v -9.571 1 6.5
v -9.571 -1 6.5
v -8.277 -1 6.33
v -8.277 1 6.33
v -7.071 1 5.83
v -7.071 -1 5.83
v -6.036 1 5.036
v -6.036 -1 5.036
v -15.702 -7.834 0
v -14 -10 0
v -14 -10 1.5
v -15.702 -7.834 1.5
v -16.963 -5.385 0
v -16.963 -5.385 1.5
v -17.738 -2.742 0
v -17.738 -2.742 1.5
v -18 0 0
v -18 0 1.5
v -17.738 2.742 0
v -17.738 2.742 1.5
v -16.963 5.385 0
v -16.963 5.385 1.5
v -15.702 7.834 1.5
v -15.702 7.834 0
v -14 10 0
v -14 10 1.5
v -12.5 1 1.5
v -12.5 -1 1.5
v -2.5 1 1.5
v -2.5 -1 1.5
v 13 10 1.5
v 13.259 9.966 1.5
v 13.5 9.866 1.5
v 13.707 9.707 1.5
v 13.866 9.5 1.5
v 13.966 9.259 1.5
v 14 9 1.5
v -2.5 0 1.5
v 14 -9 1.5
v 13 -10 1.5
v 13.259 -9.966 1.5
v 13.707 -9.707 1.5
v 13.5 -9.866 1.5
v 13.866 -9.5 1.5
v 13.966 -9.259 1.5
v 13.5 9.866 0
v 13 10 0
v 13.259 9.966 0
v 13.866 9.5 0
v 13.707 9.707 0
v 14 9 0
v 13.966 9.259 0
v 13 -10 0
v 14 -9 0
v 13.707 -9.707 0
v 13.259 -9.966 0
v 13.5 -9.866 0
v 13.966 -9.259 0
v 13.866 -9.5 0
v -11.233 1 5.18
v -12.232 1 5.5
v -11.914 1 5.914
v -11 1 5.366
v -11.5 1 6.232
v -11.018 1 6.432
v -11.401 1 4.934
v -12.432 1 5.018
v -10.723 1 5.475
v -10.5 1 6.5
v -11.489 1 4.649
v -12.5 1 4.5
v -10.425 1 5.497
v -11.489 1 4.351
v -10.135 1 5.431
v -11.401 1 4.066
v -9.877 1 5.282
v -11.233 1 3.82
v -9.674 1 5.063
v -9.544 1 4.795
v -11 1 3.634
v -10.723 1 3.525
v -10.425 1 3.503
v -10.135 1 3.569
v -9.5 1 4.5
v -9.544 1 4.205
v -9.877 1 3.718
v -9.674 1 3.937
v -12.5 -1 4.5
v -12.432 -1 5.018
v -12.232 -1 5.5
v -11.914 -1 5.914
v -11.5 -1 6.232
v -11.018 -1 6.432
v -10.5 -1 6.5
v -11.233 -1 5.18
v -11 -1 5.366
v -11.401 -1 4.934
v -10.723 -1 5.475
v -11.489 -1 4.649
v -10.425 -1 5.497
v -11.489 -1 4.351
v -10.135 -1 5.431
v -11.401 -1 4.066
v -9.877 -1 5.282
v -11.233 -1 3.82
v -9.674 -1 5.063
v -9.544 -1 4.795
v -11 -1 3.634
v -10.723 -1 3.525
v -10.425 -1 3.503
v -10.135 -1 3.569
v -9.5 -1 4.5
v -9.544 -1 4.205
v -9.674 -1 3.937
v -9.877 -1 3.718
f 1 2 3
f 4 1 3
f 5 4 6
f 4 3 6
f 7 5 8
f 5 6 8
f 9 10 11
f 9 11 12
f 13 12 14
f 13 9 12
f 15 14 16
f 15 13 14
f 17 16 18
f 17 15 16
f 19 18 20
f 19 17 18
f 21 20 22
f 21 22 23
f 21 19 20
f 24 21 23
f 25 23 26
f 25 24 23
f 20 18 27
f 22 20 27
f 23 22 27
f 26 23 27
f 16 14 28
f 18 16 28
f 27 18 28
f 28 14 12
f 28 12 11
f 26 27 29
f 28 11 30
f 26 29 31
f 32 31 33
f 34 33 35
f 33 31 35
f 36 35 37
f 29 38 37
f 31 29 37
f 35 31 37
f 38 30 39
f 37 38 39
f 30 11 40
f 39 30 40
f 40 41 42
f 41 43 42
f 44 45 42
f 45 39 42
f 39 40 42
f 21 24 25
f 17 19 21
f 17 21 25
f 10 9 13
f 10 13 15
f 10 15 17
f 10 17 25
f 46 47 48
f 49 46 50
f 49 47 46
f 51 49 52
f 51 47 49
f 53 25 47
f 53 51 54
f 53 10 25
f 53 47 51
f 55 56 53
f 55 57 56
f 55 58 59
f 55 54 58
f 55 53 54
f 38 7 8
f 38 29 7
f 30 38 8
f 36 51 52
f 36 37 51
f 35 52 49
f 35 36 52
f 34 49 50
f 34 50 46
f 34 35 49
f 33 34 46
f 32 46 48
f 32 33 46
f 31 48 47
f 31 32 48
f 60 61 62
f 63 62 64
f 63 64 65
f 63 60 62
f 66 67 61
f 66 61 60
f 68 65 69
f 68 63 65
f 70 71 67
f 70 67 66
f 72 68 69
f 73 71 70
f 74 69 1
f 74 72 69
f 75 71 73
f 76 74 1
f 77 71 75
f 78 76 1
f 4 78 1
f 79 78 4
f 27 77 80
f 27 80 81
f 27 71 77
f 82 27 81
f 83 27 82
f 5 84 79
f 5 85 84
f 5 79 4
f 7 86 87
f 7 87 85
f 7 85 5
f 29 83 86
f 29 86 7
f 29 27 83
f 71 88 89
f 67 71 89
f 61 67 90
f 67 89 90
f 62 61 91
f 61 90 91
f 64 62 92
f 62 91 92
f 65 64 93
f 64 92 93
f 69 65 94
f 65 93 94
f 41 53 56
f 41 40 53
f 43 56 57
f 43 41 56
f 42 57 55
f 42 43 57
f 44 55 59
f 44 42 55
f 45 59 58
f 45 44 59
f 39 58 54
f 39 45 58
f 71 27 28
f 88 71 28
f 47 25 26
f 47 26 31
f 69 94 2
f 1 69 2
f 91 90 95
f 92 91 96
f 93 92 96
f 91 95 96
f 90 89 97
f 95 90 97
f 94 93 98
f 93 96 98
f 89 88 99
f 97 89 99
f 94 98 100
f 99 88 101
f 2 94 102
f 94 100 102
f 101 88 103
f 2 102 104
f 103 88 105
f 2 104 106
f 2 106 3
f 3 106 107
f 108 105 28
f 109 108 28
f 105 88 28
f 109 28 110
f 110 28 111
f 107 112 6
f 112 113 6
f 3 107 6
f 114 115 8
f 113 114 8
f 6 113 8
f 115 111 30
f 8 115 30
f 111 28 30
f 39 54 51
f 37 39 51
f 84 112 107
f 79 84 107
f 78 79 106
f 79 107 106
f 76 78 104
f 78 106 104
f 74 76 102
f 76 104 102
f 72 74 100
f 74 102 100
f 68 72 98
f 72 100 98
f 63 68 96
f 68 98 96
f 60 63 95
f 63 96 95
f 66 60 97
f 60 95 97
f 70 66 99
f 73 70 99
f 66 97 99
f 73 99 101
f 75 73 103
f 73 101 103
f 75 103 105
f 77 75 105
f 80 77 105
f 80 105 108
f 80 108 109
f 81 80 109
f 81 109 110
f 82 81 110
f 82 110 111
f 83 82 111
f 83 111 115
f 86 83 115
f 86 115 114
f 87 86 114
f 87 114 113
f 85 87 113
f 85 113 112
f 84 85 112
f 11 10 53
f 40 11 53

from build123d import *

# Parameters (mm, degrees)
F0_W      = 28
F0_H      = 20
F1_DEPTH  = 1.5
F2_R      = 1
F3_W      = 10
F3_H      = 1
F4_DEPTH  = 5
F5_R      = 2
F6_SIZE   = 4.99999
F7_R      = 5
F9_R      = 1
F10_DEPTH = 25
F12_DEPTH = 1.5


# Not quite as in the source:
# - a fillet or chamfer is up to 0.001 mm smaller than in the source, because OpenCascade refuses the exact size


with BuildPart() as f1:
    # F0 (on Top) → F1 (new body)
    with BuildSketch(Plane.XY):
        Rectangle(F0_W, F0_H)
    extrude(amount=F1_DEPTH)

    # F2
    f2_edges = [f1.edges().sort_by_distance(p)[0] for p in [
        (14, -10, 0.75),
        (14, 10, 0.75),
    ]]
    fillet(f2_edges, radius=F2_R)



with BuildPart() as f4:
    # F3 (on face) → F4 (new body)
    with BuildSketch(Plane.XY.offset(1.5)):
        with Locations((-7.5, 0.5)):
            Rectangle(F3_W, F3_H)
    extrude(amount=F4_DEPTH)

    # F5
    f5_edges = [f4.edges().sort_by_distance(p)[0] for p in [
        (-12.5, 0.5, 6.5),
    ]]
    fillet(f5_edges, radius=F5_R)

    # F6 (size 5 in the source; OpenCascade refuses exactly that, so slightly less here)
    f6_edges = [f4.edges().sort_by_distance(p)[0] for p in [
        (-2.5, 0.5, 6.5),
    ]]
    chamfer(f6_edges, length=F6_SIZE)

    # F7
    f7_edges = [f4.edges().sort_by_distance(p)[0] for p in [
        (-7.49999, 0.5, 6.5),
    ]]
    fillet(f7_edges, radius=F7_R)


with BuildPart() as f1_1:
    add(f1.part)

    add(f4.part)  # F8 merges F4
    # F8: F4 across plane
    add(f4.part.mirror(Plane.XZ))

    # F9 (on face) → F10 (cut)
    with BuildSketch(Plane.XZ.offset(1)):
        with Locations((-10.5, 4.5)):
            Circle(F9_R)
    extrude(amount=-F10_DEPTH, mode=Mode.SUBTRACT)

    # F11 (on face) → F12 (join)
    with BuildSketch(Plane(origin=(0, 0, 0), x_dir=(1, 0, 0), z_dir=(0, 0, -1))):
        with BuildLine():
            Line((-14, -10), (-14, 10))
            ThreePointArc((-14, 10), (-18, 0), (-14, -10))
        make_face()
    extrude(amount=-F12_DEPTH)


solid = f1_1.part
